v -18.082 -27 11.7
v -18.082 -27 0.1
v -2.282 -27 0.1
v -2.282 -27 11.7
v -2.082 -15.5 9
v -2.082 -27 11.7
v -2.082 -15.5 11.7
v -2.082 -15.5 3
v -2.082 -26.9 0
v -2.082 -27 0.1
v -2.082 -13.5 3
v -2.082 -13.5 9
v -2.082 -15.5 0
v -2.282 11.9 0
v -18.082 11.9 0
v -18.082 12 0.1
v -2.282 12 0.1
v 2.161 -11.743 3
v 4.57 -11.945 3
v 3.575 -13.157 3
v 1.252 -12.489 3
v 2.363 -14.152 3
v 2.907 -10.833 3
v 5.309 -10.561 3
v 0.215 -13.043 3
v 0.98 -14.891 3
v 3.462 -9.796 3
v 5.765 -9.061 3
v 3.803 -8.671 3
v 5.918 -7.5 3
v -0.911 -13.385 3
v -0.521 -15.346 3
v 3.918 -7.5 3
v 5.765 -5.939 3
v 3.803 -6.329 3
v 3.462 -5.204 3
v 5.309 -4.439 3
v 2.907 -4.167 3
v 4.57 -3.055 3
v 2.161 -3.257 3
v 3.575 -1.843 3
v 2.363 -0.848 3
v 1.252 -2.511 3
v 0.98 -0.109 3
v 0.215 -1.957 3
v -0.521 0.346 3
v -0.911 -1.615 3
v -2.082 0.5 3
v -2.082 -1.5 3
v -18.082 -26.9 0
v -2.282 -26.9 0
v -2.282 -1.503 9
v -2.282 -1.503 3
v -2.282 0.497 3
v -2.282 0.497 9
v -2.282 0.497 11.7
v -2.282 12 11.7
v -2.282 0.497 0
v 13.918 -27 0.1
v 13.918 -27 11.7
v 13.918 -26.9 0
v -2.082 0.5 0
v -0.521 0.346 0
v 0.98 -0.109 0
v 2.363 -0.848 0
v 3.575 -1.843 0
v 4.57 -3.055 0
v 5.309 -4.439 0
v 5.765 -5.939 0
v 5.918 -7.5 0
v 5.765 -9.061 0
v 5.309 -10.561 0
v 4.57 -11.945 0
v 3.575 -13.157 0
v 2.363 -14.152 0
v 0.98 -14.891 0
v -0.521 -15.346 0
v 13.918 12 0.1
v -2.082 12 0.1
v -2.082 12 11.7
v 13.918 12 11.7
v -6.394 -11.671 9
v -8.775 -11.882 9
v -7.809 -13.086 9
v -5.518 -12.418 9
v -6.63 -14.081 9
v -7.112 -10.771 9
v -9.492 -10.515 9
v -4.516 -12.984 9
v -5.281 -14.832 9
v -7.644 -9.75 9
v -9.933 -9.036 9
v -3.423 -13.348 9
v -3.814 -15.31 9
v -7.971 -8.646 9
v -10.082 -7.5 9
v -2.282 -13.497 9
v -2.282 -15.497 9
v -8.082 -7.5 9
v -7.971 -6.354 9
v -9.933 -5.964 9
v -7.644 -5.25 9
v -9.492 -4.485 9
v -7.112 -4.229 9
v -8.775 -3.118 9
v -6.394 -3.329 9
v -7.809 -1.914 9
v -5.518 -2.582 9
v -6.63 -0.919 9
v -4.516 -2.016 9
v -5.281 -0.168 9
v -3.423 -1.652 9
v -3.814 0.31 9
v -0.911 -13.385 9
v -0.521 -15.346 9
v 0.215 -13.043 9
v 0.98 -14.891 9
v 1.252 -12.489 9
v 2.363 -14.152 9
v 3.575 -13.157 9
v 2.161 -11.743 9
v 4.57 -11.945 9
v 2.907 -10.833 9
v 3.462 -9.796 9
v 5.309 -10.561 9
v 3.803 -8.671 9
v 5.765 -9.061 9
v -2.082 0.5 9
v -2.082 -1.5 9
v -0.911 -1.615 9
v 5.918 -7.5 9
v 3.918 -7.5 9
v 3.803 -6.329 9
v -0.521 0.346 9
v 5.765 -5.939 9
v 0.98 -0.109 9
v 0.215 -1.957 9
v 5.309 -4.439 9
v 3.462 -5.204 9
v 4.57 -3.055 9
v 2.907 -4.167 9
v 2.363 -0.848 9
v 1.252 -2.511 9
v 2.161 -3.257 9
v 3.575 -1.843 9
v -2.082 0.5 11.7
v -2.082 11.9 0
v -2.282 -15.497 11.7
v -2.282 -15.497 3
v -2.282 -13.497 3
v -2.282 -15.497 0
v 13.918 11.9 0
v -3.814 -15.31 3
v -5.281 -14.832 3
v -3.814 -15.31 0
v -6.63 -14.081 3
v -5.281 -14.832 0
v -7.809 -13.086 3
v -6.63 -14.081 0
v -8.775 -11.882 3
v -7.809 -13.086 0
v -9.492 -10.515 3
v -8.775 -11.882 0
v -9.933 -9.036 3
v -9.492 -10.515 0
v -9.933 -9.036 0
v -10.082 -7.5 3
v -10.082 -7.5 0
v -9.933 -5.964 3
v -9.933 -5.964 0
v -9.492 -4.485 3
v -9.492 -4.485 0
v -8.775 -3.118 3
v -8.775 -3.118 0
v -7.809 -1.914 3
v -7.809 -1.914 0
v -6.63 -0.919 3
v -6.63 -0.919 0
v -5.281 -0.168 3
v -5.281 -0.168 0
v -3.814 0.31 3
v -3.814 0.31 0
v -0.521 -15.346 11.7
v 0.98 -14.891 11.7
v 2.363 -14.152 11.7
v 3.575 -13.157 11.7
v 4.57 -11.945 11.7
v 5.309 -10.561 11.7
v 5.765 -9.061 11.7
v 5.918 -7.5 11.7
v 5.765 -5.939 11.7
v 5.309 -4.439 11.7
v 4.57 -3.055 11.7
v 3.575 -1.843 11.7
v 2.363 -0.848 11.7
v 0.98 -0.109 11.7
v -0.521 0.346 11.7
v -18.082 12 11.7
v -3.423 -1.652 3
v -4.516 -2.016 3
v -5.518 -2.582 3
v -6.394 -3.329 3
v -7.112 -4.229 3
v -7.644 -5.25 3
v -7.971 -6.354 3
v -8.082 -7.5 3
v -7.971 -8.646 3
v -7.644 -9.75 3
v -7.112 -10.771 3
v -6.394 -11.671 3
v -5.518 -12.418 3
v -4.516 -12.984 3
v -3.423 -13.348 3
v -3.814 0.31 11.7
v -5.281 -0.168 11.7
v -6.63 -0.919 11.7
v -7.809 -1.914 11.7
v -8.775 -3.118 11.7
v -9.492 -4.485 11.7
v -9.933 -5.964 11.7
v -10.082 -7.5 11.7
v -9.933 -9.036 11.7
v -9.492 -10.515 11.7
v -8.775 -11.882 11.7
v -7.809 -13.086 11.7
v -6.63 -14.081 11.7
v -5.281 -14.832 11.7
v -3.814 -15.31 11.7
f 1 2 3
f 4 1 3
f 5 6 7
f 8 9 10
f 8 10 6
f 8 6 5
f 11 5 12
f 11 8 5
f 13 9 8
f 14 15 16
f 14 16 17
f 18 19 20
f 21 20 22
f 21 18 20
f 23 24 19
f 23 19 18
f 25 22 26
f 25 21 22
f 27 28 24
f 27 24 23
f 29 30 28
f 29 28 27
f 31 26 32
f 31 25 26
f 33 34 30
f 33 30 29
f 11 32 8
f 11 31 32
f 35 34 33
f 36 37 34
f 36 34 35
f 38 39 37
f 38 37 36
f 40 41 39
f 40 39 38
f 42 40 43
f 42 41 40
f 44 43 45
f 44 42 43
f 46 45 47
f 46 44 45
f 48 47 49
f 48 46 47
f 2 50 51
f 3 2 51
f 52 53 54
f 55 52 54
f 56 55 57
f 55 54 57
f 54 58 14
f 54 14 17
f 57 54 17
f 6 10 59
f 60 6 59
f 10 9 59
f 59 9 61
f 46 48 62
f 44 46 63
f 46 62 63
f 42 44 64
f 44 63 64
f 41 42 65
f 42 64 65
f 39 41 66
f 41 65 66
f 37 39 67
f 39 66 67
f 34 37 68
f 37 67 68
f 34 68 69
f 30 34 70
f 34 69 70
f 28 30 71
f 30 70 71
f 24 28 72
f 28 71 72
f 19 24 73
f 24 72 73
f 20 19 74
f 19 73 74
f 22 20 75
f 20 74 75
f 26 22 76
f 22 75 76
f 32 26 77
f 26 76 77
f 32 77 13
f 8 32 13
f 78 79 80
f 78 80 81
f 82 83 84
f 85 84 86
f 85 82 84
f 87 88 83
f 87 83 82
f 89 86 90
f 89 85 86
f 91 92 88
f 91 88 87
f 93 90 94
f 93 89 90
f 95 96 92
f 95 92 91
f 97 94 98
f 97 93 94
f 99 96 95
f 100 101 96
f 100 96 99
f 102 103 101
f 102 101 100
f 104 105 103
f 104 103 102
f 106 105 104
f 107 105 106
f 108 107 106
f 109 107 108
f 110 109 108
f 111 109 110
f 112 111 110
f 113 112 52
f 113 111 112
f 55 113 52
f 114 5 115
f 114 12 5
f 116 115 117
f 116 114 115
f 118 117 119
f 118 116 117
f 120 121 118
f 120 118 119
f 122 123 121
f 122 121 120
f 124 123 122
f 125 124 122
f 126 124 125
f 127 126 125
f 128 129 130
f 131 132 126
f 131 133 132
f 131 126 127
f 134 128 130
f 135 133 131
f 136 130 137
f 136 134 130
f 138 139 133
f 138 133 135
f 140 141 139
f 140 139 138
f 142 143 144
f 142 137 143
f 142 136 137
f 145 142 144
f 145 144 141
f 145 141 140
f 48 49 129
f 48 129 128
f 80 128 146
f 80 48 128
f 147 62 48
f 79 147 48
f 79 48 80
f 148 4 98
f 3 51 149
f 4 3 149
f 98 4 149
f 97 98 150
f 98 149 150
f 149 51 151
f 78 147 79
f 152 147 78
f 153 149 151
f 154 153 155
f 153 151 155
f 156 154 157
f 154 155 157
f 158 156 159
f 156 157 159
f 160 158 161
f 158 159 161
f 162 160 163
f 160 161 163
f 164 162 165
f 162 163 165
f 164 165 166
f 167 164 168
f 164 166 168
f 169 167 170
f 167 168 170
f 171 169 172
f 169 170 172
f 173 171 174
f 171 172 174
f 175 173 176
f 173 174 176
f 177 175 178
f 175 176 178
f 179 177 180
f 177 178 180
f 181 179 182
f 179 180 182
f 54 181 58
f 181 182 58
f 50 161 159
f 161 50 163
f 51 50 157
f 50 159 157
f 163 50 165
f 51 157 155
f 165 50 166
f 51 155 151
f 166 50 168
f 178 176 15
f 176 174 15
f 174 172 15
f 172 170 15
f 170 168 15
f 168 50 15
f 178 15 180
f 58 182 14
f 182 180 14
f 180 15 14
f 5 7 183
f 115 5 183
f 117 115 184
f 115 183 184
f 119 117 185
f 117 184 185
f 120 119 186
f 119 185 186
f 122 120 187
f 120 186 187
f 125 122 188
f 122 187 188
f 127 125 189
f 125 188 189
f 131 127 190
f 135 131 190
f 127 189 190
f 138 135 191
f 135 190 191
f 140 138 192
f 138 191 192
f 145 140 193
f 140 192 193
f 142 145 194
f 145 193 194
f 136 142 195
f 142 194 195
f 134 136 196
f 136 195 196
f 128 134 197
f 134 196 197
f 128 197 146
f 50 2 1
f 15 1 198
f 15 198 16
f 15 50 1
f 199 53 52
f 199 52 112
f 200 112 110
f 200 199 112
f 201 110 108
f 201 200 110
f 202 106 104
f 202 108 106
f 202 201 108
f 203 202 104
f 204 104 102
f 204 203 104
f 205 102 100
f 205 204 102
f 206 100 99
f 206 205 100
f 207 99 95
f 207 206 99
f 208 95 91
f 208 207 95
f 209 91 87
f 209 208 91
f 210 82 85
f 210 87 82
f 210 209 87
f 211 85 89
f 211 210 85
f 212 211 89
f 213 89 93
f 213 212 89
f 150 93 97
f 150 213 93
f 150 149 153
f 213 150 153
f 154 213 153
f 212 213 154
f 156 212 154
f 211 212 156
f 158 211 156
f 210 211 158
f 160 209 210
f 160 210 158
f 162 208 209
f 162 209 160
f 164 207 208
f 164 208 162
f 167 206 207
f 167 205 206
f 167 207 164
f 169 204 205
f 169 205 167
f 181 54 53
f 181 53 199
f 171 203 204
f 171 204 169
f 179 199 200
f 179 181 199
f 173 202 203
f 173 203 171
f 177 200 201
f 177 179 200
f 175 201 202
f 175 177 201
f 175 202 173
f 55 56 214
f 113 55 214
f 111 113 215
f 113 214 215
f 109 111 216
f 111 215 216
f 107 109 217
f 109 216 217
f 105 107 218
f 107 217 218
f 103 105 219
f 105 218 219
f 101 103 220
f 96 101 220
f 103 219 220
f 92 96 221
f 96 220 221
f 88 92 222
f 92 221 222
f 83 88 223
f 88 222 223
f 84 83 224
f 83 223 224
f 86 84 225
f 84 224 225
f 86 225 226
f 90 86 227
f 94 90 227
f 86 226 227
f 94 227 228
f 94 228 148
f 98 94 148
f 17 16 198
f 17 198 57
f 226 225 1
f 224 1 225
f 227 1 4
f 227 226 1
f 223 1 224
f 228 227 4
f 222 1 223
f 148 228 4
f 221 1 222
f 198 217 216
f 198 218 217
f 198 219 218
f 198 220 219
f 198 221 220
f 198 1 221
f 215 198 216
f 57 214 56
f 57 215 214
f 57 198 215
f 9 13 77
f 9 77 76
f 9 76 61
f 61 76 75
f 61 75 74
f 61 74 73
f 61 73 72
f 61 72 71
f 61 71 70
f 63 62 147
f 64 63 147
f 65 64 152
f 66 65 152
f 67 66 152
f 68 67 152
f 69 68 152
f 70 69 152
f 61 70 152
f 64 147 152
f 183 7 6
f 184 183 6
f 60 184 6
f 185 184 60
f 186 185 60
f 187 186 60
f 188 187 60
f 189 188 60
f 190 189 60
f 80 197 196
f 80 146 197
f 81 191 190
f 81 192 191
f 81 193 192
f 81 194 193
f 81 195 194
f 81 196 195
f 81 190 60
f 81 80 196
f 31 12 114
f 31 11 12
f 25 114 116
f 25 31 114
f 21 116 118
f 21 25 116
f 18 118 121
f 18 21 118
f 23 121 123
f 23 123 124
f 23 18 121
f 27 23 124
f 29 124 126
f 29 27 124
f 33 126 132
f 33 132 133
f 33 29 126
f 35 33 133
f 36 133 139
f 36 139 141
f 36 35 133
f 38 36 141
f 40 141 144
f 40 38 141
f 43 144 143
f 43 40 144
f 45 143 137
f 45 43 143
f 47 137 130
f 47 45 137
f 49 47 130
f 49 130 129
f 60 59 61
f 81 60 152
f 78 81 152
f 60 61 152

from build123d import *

# Parameters (mm, degrees)
SKICA1_W                  = 32
SKICA1_H                  = 39
SKICA1_R                  = 8
SKICA1_R_2                = 6
P_IDAT_VYSUNUT_M1_DEPTH   = 12.7
SKICA3_R                  = 8
ODEBRAT_VYSUNUT_M2_DEPTH  = 3.7
SKICA4_R                  = 8
ODEBRAT_VYSUNUT_M3_DEPTH  = 3
ZKOSEN_1_SIZE             = 0.1
ODEBRAT_START             = -12.7
SKICA10_W                 = 0.2
SKICA10_H                 = 39
ODEBRAT_VYSUNUT_M13_DEPTH = 12.7
SKETCH1_W                 = 58.510416229
SKETCH1_H                 = 45.106423975
CUT_EXTRUDE1_DEPTH        = 1


with BuildPart() as part:
    # Skica1 → Přidat vysunutím1 (new body)
    with BuildSketch(Plane.XY):
        with Locations((-2.081569801, -7.5)):
            Rectangle(SKICA1_W, SKICA1_H)
        with Locations((-2.081569801, -7.5)):
            Circle(SKICA1_R, mode=Mode.SUBTRACT)
        with Locations((-2.081569801, -7.5)):
            Circle(SKICA1_R)
        with Locations((-2.081569801, -7.5)):
            Circle(SKICA1_R_2, mode=Mode.SUBTRACT)
    extrude(amount=P_IDAT_VYSUNUT_M1_DEPTH)

    # Skica3 → Odebrat vysunutím2 (cut)
    with BuildSketch(Plane.XY.offset(12.7)):
        with Locations((-2.081569801, -7.5)):
            Circle(SKICA3_R)
    extrude(amount=-ODEBRAT_VYSUNUT_M2_DEPTH, mode=Mode.SUBTRACT)

    # Skica4 → Odebrat vysunutím3 (cut)
    with BuildSketch(Plane(origin=(0, 0, 0), x_dir=(-1, 0, 0), z_dir=(0, 0, -1))):
        with Locations((2.081569801, -7.5)):
            Circle(SKICA4_R)
    extrude(amount=-ODEBRAT_VYSUNUT_M3_DEPTH, mode=Mode.SUBTRACT)

    # Zkosení1
    zkosen_1_edges = [part.edges().sort_by_distance(p)[0] for p in [
        (-2.081569801, 12, 12.7),
        (-2.081569801, -27, 12.7),
        (-2.081569801, 12, 0),
        (-2.081569801, -27, 0),
    ]]
    chamfer(zkosen_1_edges, length=ZKOSEN_1_SIZE)

    # Skica10 → Odebrat vysunutím13 (cut)
    with BuildSketch(Plane.XY.offset(12.7).offset(ODEBRAT_START)):
        with Locations((-2.181569801, -7.5)):
            Rectangle(SKICA10_W, SKICA10_H)
    extrude(amount=ODEBRAT_VYSUNUT_M13_DEPTH, mode=Mode.SUBTRACT)

    # Sketch1 → Cut-Extrude1 (cut)
    with BuildSketch(Plane.XY.offset(12.7)):
        with Locations((-1.43113659, -7.98245449)):
            Rectangle(SKETCH1_W, SKETCH1_H)
    extrude(amount=-CUT_EXTRUDE1_DEPTH, mode=Mode.SUBTRACT)


solid = part.part
